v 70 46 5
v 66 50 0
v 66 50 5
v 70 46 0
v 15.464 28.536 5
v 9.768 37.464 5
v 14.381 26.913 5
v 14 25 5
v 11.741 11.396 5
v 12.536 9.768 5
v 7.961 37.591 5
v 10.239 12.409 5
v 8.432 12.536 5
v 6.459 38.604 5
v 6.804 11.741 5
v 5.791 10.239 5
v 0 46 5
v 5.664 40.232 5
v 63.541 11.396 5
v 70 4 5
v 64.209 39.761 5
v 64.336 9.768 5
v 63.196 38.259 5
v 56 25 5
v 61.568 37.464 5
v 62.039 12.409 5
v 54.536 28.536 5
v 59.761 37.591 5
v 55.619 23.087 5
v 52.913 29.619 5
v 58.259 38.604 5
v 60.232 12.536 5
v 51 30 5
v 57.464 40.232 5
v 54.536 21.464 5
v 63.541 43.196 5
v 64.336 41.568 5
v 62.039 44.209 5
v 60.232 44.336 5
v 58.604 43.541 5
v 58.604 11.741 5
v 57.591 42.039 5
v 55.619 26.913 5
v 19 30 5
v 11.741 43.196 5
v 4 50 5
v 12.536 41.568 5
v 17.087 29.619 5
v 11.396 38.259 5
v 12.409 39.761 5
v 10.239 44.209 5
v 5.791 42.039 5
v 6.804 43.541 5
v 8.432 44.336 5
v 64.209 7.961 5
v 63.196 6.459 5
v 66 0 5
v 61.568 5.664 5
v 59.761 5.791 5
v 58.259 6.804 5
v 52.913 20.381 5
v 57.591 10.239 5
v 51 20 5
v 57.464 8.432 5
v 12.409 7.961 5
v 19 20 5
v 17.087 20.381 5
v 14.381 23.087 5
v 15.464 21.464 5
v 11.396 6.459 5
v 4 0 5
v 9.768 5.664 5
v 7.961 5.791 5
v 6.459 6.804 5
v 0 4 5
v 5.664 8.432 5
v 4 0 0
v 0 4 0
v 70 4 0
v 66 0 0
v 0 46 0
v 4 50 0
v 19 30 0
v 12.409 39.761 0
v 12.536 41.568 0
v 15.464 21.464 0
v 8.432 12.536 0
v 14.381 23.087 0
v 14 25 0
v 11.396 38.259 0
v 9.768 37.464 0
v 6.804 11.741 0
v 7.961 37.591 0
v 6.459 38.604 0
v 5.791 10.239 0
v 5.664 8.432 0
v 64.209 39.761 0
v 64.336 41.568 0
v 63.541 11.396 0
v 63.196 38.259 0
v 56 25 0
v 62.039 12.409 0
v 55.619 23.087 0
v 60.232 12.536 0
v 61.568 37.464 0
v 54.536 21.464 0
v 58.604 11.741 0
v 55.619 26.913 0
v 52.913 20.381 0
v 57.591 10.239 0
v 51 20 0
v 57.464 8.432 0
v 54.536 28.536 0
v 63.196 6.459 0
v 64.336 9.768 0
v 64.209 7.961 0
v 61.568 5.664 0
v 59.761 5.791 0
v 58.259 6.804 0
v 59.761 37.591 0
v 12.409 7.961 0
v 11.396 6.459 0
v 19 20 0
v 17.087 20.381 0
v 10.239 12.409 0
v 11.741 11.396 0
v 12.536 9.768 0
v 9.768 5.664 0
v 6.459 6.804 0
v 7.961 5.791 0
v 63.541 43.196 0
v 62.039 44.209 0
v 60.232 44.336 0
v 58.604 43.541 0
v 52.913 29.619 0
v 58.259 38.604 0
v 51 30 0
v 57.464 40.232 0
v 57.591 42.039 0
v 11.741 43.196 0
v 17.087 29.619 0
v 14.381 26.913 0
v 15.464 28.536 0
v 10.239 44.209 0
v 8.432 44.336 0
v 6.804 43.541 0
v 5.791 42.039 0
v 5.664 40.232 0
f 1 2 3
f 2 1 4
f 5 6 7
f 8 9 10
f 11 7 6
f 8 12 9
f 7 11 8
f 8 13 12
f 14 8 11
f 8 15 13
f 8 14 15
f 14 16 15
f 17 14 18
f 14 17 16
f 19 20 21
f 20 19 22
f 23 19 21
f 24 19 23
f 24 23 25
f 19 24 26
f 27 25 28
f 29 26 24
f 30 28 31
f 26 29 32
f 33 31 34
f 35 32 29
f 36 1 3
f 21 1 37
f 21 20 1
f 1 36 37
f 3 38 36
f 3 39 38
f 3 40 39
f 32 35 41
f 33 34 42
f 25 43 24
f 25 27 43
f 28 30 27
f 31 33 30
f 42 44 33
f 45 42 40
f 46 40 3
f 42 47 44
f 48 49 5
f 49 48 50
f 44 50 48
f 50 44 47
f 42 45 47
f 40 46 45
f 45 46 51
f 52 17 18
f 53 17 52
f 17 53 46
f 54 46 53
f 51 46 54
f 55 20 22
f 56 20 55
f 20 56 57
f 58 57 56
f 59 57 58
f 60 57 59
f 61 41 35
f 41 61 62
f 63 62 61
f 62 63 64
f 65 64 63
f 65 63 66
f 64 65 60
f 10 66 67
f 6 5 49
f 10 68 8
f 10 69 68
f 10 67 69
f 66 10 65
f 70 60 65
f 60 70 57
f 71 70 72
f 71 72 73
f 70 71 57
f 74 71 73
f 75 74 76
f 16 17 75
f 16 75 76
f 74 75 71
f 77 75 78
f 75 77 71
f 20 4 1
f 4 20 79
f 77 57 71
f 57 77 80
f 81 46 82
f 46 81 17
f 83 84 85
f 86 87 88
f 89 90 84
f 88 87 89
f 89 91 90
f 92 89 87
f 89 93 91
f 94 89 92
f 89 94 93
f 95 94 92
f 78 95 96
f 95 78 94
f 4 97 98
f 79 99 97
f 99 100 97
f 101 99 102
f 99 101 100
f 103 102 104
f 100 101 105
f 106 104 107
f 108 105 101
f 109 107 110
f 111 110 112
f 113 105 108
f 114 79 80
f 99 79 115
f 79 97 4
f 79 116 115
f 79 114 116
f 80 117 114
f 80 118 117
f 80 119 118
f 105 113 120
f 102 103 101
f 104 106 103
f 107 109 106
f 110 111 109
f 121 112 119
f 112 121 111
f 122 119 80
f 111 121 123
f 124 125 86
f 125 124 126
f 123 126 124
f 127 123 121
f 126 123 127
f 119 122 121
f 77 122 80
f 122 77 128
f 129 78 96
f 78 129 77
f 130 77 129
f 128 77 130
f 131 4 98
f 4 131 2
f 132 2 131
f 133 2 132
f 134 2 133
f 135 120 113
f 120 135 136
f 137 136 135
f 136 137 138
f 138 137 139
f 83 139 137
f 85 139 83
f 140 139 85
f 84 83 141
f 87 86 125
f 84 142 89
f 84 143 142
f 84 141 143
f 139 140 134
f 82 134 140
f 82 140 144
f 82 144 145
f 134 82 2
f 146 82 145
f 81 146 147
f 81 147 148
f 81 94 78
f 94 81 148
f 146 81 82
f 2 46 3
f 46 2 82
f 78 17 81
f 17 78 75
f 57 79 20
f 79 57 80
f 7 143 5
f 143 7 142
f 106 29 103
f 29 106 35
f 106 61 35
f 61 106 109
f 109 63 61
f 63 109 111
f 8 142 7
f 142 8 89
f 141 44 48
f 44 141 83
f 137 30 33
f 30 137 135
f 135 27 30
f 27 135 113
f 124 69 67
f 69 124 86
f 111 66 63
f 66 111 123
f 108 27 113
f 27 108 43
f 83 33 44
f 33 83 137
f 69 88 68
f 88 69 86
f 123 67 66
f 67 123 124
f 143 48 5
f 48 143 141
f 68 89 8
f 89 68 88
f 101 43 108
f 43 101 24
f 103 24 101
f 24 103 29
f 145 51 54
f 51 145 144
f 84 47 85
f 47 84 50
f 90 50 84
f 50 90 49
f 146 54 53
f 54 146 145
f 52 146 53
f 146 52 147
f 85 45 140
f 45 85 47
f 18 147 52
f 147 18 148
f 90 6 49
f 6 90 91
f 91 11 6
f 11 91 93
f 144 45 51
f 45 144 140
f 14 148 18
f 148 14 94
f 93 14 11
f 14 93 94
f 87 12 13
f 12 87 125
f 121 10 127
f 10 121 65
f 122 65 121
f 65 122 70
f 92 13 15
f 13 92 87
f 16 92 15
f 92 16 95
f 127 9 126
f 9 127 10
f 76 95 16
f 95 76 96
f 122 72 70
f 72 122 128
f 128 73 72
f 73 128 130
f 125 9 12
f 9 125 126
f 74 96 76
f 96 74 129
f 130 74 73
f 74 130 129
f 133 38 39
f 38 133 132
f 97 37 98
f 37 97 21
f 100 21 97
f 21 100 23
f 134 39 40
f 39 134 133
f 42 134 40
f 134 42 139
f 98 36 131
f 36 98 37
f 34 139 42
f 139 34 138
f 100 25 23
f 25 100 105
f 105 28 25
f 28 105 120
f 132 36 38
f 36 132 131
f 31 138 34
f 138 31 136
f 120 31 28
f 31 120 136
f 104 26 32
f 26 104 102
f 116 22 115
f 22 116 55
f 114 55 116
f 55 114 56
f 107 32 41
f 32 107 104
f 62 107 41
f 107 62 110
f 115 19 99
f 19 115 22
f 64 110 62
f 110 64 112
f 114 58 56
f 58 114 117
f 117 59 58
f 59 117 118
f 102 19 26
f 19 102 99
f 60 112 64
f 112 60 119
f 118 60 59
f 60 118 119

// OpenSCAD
$fn = 32;

// ----------------------------------------------------------------------
// Bracket plate: slot plate 70 x 50
// ----------------------------------------------------------------------

// --- parameters (mm) ---
hole_r = 3.5;             // bolt hole radius
plate_t = 5;              // plate thickness, Z (extrusion height)
plate_l = 70;             // plate length
plate_w = 50;             // plate width
slot_l = 32;              // slot straight length
slot_r = 5;               // slot end radius

slot_len = slot_l + 2 * slot_r;
slot_w = 2 * slot_r;
hole_d2 = 2 * hole_r;

profile = [[4, 0], [66, 0], [70, 4], [70, 46], [66, 50], [4, 50], [0, 46], [0, 4]];  // primary outline, 8 points, counter clockwise
void_1 = [[51, 20], [52.913, 20.381], [54.536, 21.464], [55.619, 23.087], [56, 25], [55.619, 26.913], [54.536, 28.536], [52.913, 29.619], [51, 30], [19, 30], [17.087, 29.619], [15.464, 28.536], [14.381, 26.913], [14, 25], [14.381, 23.087], [15.464, 21.464], [17.087, 20.381], [19, 20]];  // grip slot, 18 points
void_2 = [[12.536, 41.568], [11.741, 43.196], [10.239, 44.209], [8.432, 44.336], [6.804, 43.541], [5.791, 42.039], [5.664, 40.232], [6.459, 38.604], [7.961, 37.591], [9.768, 37.464], [11.396, 38.259], [12.409, 39.761]];  // corner hole, 12 points
void_3 = [[12.536, 9.768], [11.741, 11.396], [10.239, 12.409], [8.432, 12.536], [6.804, 11.741], [5.791, 10.239], [5.664, 8.432], [6.459, 6.804], [7.961, 5.791], [9.768, 5.664], [11.396, 6.459], [12.409, 7.961]];  // corner hole, 12 points
void_4 = [[64.336, 41.568], [63.541, 43.196], [62.039, 44.209], [60.232, 44.336], [58.604, 43.541], [57.591, 42.039], [57.464, 40.232], [58.259, 38.604], [59.761, 37.591], [61.568, 37.464], [63.196, 38.259], [64.209, 39.761]];  // corner hole, 12 points
void_5 = [[64.336, 9.768], [63.541, 11.396], [62.039, 12.409], [60.232, 12.536], [58.604, 11.741], [57.591, 10.239], [57.464, 8.432], [58.259, 6.804], [59.761, 5.791], [61.568, 5.664], [63.196, 6.459], [64.209, 7.961]];  // corner hole, 12 points

// --- the one profile operation ---
difference() {
  linear_extrude(height = plate_t) polygon(points = profile);
  translate([0, 0, -1])
    linear_extrude(height = plate_t + 2) polygon(points = void_1);
  translate([0, 0, -1])
    linear_extrude(height = plate_t + 2) polygon(points = void_2);
  translate([0, 0, -1])
    linear_extrude(height = plate_t + 2) polygon(points = void_3);
  translate([0, 0, -1])
    linear_extrude(height = plate_t + 2) polygon(points = void_4);
  translate([0, 0, -1])
    linear_extrude(height = plate_t + 2) polygon(points = void_5);
}
